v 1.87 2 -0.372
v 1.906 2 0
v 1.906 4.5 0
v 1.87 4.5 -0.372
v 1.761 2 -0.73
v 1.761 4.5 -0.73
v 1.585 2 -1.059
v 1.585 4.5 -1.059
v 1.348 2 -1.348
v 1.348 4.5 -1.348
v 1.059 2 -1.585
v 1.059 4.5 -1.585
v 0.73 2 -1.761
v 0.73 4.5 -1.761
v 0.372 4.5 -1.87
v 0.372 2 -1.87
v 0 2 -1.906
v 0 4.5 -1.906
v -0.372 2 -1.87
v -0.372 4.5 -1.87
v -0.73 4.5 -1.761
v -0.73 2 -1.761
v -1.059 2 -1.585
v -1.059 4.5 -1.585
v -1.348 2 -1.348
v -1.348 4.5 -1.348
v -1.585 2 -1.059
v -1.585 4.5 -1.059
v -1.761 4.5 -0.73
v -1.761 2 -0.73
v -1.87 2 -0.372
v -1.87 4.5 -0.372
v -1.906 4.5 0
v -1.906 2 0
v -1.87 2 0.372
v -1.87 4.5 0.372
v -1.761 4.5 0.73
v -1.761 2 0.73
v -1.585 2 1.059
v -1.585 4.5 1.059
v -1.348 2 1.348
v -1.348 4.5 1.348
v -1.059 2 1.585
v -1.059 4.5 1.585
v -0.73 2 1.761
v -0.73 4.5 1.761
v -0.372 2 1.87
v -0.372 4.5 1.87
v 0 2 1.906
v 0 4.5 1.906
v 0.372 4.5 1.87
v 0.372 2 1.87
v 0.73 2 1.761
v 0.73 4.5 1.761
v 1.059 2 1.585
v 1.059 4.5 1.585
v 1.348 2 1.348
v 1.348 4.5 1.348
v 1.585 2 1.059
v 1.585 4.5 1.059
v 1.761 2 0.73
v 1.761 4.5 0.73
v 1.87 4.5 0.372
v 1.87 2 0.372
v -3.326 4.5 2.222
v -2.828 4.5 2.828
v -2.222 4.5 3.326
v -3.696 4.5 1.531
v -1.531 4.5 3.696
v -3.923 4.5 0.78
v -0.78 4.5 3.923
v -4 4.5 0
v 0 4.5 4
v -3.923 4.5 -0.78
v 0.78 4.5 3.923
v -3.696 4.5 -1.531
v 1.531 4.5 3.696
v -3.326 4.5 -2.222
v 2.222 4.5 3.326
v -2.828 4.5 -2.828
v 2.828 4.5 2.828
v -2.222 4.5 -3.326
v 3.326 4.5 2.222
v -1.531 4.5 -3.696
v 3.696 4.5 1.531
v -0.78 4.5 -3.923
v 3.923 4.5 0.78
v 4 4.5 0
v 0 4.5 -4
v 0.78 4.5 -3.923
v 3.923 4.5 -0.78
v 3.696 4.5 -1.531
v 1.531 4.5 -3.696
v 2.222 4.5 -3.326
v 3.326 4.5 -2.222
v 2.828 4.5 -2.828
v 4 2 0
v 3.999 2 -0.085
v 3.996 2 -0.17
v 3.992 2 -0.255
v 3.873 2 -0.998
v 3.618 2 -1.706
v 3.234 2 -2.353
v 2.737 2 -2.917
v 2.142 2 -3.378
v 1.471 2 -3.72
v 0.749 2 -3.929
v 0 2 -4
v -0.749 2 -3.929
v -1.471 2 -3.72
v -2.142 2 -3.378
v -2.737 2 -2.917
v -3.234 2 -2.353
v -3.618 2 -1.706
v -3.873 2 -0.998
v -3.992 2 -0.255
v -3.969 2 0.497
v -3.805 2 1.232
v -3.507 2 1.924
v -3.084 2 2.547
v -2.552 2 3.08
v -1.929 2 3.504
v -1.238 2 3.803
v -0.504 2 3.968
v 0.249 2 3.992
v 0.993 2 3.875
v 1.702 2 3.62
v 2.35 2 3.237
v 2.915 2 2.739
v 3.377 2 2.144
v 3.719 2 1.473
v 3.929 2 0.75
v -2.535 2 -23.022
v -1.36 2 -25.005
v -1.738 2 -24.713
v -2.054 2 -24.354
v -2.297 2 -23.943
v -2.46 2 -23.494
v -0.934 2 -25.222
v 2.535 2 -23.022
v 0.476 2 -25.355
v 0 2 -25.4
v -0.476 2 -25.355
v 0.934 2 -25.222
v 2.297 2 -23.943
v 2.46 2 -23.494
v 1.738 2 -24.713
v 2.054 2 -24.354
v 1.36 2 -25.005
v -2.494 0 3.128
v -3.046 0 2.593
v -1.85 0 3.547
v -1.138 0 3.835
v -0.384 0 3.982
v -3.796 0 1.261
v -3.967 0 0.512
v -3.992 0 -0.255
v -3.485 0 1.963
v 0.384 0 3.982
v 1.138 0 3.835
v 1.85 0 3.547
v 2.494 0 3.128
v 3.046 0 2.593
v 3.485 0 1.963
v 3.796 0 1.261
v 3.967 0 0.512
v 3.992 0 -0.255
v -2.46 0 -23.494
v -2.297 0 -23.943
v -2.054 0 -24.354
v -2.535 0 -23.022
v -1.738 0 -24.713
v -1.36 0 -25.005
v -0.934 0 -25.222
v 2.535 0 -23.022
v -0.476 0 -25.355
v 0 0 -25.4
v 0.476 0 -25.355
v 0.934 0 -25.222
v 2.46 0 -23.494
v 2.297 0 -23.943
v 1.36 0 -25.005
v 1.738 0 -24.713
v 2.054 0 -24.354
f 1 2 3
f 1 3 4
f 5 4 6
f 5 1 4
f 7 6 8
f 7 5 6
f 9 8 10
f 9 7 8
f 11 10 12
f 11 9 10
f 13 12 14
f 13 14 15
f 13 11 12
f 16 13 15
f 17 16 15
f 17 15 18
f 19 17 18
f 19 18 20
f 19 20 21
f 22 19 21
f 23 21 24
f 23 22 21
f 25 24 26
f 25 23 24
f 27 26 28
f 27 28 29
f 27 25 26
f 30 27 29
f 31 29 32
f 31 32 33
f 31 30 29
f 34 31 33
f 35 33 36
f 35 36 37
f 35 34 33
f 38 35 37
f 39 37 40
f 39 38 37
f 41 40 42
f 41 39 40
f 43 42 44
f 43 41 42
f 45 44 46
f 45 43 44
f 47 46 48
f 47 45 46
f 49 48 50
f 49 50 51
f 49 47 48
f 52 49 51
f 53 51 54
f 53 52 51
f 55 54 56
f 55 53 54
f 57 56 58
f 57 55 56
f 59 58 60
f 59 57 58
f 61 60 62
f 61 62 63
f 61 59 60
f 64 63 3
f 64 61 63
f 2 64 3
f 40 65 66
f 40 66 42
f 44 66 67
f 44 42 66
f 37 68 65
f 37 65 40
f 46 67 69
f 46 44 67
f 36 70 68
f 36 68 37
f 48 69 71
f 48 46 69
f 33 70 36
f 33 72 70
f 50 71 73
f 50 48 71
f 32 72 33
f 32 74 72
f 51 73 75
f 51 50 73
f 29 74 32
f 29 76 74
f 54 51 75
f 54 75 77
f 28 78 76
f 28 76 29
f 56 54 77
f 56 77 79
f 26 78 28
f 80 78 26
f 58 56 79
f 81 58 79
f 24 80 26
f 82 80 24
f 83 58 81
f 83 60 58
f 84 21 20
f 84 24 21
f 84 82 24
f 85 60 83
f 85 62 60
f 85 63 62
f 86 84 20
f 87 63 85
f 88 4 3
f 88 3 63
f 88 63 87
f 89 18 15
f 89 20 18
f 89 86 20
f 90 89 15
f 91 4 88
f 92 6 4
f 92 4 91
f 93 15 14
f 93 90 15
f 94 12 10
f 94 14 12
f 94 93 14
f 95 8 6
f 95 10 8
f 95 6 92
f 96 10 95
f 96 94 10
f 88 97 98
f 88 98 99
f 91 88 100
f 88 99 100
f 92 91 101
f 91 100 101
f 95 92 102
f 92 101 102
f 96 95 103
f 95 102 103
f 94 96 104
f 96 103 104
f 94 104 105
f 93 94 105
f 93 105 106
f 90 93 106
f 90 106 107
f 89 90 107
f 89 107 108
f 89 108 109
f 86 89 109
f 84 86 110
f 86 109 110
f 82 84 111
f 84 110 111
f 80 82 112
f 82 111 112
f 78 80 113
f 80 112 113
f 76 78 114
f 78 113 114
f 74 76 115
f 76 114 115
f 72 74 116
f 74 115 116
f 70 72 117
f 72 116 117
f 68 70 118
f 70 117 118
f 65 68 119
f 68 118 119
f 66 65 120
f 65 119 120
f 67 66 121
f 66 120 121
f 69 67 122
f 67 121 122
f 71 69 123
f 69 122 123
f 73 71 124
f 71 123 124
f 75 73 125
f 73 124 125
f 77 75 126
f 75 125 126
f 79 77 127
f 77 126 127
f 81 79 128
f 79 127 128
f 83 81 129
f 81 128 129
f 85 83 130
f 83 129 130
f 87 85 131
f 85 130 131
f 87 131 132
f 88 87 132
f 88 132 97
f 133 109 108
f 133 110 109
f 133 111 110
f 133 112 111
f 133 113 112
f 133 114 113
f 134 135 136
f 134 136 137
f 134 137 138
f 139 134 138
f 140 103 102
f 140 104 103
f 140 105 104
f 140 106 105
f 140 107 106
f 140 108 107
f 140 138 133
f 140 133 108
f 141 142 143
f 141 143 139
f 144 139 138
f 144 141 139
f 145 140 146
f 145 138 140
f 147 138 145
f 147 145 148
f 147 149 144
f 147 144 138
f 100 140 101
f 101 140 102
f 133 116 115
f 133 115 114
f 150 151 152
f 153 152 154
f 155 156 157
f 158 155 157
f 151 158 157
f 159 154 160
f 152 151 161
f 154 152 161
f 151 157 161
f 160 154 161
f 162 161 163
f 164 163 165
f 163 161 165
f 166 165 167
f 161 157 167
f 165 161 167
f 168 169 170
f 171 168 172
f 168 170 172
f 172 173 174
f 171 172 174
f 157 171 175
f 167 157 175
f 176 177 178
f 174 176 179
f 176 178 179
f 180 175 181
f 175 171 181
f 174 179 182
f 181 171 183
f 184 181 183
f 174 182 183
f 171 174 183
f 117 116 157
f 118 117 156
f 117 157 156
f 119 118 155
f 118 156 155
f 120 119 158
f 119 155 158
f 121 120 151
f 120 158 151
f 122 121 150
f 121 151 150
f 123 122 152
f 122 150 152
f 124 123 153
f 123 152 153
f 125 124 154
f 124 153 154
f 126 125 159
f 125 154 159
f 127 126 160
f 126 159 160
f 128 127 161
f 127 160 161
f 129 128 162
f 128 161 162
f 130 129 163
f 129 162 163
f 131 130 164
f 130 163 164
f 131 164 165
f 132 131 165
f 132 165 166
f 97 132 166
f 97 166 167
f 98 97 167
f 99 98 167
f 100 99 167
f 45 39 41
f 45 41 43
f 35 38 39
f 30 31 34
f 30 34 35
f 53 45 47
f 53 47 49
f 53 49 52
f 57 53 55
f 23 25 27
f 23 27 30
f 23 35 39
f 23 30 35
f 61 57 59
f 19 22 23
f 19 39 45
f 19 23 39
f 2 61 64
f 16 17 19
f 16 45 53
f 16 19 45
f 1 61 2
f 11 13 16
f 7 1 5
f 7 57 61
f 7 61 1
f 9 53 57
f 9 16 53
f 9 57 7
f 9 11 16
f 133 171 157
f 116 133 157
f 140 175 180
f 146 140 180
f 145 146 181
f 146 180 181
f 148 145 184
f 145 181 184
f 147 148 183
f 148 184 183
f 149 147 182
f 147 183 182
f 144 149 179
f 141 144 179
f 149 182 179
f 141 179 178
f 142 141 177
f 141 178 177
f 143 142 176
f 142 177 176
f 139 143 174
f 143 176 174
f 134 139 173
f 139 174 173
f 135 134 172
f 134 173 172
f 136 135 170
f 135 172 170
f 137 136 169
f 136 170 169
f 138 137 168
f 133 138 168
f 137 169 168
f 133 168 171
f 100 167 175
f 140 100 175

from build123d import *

# Parameters (mm, degrees)
BOSS_EXTRUDE1_DEPTH = 2
SKETCH2_R           = 4
SKETCH2_R_2         = 1.906385326
BOSS_EXTRUDE2_DEPTH = 2.5


with BuildPart() as part:
    # Sketch1 → Boss-Extrude1 (new body)
    with BuildSketch(Plane(origin=(0, 0, 0), x_dir=(1, 0, 0), z_dir=(0, 1, 0))):
        with BuildLine():
            Line((3.991833672, 0.255468066), (2.534814382, 23.022222222))
            ThreePointArc((2.534814382, 23.022222222), (0, 25.4), (-2.534814382, 23.022222222))
            Line((-2.534814382, 23.022222222), (-3.991833672, 0.255468066))
            ThreePointArc((-3.991833672, 0.255468066), (0, -4), (3.991833672, 0.255468066))
        make_face()
    extrude(amount=BOSS_EXTRUDE1_DEPTH)

    # Sketch2 → Boss-Extrude2 (add)
    with BuildSketch(Plane(origin=(0, 2, 0), x_dir=(1, 0, 0), z_dir=(0, 1, 0))):
        Circle(SKETCH2_R)
        Circle(SKETCH2_R_2, mode=Mode.SUBTRACT)
    extrude(amount=BOSS_EXTRUDE2_DEPTH)


solid = part.part
